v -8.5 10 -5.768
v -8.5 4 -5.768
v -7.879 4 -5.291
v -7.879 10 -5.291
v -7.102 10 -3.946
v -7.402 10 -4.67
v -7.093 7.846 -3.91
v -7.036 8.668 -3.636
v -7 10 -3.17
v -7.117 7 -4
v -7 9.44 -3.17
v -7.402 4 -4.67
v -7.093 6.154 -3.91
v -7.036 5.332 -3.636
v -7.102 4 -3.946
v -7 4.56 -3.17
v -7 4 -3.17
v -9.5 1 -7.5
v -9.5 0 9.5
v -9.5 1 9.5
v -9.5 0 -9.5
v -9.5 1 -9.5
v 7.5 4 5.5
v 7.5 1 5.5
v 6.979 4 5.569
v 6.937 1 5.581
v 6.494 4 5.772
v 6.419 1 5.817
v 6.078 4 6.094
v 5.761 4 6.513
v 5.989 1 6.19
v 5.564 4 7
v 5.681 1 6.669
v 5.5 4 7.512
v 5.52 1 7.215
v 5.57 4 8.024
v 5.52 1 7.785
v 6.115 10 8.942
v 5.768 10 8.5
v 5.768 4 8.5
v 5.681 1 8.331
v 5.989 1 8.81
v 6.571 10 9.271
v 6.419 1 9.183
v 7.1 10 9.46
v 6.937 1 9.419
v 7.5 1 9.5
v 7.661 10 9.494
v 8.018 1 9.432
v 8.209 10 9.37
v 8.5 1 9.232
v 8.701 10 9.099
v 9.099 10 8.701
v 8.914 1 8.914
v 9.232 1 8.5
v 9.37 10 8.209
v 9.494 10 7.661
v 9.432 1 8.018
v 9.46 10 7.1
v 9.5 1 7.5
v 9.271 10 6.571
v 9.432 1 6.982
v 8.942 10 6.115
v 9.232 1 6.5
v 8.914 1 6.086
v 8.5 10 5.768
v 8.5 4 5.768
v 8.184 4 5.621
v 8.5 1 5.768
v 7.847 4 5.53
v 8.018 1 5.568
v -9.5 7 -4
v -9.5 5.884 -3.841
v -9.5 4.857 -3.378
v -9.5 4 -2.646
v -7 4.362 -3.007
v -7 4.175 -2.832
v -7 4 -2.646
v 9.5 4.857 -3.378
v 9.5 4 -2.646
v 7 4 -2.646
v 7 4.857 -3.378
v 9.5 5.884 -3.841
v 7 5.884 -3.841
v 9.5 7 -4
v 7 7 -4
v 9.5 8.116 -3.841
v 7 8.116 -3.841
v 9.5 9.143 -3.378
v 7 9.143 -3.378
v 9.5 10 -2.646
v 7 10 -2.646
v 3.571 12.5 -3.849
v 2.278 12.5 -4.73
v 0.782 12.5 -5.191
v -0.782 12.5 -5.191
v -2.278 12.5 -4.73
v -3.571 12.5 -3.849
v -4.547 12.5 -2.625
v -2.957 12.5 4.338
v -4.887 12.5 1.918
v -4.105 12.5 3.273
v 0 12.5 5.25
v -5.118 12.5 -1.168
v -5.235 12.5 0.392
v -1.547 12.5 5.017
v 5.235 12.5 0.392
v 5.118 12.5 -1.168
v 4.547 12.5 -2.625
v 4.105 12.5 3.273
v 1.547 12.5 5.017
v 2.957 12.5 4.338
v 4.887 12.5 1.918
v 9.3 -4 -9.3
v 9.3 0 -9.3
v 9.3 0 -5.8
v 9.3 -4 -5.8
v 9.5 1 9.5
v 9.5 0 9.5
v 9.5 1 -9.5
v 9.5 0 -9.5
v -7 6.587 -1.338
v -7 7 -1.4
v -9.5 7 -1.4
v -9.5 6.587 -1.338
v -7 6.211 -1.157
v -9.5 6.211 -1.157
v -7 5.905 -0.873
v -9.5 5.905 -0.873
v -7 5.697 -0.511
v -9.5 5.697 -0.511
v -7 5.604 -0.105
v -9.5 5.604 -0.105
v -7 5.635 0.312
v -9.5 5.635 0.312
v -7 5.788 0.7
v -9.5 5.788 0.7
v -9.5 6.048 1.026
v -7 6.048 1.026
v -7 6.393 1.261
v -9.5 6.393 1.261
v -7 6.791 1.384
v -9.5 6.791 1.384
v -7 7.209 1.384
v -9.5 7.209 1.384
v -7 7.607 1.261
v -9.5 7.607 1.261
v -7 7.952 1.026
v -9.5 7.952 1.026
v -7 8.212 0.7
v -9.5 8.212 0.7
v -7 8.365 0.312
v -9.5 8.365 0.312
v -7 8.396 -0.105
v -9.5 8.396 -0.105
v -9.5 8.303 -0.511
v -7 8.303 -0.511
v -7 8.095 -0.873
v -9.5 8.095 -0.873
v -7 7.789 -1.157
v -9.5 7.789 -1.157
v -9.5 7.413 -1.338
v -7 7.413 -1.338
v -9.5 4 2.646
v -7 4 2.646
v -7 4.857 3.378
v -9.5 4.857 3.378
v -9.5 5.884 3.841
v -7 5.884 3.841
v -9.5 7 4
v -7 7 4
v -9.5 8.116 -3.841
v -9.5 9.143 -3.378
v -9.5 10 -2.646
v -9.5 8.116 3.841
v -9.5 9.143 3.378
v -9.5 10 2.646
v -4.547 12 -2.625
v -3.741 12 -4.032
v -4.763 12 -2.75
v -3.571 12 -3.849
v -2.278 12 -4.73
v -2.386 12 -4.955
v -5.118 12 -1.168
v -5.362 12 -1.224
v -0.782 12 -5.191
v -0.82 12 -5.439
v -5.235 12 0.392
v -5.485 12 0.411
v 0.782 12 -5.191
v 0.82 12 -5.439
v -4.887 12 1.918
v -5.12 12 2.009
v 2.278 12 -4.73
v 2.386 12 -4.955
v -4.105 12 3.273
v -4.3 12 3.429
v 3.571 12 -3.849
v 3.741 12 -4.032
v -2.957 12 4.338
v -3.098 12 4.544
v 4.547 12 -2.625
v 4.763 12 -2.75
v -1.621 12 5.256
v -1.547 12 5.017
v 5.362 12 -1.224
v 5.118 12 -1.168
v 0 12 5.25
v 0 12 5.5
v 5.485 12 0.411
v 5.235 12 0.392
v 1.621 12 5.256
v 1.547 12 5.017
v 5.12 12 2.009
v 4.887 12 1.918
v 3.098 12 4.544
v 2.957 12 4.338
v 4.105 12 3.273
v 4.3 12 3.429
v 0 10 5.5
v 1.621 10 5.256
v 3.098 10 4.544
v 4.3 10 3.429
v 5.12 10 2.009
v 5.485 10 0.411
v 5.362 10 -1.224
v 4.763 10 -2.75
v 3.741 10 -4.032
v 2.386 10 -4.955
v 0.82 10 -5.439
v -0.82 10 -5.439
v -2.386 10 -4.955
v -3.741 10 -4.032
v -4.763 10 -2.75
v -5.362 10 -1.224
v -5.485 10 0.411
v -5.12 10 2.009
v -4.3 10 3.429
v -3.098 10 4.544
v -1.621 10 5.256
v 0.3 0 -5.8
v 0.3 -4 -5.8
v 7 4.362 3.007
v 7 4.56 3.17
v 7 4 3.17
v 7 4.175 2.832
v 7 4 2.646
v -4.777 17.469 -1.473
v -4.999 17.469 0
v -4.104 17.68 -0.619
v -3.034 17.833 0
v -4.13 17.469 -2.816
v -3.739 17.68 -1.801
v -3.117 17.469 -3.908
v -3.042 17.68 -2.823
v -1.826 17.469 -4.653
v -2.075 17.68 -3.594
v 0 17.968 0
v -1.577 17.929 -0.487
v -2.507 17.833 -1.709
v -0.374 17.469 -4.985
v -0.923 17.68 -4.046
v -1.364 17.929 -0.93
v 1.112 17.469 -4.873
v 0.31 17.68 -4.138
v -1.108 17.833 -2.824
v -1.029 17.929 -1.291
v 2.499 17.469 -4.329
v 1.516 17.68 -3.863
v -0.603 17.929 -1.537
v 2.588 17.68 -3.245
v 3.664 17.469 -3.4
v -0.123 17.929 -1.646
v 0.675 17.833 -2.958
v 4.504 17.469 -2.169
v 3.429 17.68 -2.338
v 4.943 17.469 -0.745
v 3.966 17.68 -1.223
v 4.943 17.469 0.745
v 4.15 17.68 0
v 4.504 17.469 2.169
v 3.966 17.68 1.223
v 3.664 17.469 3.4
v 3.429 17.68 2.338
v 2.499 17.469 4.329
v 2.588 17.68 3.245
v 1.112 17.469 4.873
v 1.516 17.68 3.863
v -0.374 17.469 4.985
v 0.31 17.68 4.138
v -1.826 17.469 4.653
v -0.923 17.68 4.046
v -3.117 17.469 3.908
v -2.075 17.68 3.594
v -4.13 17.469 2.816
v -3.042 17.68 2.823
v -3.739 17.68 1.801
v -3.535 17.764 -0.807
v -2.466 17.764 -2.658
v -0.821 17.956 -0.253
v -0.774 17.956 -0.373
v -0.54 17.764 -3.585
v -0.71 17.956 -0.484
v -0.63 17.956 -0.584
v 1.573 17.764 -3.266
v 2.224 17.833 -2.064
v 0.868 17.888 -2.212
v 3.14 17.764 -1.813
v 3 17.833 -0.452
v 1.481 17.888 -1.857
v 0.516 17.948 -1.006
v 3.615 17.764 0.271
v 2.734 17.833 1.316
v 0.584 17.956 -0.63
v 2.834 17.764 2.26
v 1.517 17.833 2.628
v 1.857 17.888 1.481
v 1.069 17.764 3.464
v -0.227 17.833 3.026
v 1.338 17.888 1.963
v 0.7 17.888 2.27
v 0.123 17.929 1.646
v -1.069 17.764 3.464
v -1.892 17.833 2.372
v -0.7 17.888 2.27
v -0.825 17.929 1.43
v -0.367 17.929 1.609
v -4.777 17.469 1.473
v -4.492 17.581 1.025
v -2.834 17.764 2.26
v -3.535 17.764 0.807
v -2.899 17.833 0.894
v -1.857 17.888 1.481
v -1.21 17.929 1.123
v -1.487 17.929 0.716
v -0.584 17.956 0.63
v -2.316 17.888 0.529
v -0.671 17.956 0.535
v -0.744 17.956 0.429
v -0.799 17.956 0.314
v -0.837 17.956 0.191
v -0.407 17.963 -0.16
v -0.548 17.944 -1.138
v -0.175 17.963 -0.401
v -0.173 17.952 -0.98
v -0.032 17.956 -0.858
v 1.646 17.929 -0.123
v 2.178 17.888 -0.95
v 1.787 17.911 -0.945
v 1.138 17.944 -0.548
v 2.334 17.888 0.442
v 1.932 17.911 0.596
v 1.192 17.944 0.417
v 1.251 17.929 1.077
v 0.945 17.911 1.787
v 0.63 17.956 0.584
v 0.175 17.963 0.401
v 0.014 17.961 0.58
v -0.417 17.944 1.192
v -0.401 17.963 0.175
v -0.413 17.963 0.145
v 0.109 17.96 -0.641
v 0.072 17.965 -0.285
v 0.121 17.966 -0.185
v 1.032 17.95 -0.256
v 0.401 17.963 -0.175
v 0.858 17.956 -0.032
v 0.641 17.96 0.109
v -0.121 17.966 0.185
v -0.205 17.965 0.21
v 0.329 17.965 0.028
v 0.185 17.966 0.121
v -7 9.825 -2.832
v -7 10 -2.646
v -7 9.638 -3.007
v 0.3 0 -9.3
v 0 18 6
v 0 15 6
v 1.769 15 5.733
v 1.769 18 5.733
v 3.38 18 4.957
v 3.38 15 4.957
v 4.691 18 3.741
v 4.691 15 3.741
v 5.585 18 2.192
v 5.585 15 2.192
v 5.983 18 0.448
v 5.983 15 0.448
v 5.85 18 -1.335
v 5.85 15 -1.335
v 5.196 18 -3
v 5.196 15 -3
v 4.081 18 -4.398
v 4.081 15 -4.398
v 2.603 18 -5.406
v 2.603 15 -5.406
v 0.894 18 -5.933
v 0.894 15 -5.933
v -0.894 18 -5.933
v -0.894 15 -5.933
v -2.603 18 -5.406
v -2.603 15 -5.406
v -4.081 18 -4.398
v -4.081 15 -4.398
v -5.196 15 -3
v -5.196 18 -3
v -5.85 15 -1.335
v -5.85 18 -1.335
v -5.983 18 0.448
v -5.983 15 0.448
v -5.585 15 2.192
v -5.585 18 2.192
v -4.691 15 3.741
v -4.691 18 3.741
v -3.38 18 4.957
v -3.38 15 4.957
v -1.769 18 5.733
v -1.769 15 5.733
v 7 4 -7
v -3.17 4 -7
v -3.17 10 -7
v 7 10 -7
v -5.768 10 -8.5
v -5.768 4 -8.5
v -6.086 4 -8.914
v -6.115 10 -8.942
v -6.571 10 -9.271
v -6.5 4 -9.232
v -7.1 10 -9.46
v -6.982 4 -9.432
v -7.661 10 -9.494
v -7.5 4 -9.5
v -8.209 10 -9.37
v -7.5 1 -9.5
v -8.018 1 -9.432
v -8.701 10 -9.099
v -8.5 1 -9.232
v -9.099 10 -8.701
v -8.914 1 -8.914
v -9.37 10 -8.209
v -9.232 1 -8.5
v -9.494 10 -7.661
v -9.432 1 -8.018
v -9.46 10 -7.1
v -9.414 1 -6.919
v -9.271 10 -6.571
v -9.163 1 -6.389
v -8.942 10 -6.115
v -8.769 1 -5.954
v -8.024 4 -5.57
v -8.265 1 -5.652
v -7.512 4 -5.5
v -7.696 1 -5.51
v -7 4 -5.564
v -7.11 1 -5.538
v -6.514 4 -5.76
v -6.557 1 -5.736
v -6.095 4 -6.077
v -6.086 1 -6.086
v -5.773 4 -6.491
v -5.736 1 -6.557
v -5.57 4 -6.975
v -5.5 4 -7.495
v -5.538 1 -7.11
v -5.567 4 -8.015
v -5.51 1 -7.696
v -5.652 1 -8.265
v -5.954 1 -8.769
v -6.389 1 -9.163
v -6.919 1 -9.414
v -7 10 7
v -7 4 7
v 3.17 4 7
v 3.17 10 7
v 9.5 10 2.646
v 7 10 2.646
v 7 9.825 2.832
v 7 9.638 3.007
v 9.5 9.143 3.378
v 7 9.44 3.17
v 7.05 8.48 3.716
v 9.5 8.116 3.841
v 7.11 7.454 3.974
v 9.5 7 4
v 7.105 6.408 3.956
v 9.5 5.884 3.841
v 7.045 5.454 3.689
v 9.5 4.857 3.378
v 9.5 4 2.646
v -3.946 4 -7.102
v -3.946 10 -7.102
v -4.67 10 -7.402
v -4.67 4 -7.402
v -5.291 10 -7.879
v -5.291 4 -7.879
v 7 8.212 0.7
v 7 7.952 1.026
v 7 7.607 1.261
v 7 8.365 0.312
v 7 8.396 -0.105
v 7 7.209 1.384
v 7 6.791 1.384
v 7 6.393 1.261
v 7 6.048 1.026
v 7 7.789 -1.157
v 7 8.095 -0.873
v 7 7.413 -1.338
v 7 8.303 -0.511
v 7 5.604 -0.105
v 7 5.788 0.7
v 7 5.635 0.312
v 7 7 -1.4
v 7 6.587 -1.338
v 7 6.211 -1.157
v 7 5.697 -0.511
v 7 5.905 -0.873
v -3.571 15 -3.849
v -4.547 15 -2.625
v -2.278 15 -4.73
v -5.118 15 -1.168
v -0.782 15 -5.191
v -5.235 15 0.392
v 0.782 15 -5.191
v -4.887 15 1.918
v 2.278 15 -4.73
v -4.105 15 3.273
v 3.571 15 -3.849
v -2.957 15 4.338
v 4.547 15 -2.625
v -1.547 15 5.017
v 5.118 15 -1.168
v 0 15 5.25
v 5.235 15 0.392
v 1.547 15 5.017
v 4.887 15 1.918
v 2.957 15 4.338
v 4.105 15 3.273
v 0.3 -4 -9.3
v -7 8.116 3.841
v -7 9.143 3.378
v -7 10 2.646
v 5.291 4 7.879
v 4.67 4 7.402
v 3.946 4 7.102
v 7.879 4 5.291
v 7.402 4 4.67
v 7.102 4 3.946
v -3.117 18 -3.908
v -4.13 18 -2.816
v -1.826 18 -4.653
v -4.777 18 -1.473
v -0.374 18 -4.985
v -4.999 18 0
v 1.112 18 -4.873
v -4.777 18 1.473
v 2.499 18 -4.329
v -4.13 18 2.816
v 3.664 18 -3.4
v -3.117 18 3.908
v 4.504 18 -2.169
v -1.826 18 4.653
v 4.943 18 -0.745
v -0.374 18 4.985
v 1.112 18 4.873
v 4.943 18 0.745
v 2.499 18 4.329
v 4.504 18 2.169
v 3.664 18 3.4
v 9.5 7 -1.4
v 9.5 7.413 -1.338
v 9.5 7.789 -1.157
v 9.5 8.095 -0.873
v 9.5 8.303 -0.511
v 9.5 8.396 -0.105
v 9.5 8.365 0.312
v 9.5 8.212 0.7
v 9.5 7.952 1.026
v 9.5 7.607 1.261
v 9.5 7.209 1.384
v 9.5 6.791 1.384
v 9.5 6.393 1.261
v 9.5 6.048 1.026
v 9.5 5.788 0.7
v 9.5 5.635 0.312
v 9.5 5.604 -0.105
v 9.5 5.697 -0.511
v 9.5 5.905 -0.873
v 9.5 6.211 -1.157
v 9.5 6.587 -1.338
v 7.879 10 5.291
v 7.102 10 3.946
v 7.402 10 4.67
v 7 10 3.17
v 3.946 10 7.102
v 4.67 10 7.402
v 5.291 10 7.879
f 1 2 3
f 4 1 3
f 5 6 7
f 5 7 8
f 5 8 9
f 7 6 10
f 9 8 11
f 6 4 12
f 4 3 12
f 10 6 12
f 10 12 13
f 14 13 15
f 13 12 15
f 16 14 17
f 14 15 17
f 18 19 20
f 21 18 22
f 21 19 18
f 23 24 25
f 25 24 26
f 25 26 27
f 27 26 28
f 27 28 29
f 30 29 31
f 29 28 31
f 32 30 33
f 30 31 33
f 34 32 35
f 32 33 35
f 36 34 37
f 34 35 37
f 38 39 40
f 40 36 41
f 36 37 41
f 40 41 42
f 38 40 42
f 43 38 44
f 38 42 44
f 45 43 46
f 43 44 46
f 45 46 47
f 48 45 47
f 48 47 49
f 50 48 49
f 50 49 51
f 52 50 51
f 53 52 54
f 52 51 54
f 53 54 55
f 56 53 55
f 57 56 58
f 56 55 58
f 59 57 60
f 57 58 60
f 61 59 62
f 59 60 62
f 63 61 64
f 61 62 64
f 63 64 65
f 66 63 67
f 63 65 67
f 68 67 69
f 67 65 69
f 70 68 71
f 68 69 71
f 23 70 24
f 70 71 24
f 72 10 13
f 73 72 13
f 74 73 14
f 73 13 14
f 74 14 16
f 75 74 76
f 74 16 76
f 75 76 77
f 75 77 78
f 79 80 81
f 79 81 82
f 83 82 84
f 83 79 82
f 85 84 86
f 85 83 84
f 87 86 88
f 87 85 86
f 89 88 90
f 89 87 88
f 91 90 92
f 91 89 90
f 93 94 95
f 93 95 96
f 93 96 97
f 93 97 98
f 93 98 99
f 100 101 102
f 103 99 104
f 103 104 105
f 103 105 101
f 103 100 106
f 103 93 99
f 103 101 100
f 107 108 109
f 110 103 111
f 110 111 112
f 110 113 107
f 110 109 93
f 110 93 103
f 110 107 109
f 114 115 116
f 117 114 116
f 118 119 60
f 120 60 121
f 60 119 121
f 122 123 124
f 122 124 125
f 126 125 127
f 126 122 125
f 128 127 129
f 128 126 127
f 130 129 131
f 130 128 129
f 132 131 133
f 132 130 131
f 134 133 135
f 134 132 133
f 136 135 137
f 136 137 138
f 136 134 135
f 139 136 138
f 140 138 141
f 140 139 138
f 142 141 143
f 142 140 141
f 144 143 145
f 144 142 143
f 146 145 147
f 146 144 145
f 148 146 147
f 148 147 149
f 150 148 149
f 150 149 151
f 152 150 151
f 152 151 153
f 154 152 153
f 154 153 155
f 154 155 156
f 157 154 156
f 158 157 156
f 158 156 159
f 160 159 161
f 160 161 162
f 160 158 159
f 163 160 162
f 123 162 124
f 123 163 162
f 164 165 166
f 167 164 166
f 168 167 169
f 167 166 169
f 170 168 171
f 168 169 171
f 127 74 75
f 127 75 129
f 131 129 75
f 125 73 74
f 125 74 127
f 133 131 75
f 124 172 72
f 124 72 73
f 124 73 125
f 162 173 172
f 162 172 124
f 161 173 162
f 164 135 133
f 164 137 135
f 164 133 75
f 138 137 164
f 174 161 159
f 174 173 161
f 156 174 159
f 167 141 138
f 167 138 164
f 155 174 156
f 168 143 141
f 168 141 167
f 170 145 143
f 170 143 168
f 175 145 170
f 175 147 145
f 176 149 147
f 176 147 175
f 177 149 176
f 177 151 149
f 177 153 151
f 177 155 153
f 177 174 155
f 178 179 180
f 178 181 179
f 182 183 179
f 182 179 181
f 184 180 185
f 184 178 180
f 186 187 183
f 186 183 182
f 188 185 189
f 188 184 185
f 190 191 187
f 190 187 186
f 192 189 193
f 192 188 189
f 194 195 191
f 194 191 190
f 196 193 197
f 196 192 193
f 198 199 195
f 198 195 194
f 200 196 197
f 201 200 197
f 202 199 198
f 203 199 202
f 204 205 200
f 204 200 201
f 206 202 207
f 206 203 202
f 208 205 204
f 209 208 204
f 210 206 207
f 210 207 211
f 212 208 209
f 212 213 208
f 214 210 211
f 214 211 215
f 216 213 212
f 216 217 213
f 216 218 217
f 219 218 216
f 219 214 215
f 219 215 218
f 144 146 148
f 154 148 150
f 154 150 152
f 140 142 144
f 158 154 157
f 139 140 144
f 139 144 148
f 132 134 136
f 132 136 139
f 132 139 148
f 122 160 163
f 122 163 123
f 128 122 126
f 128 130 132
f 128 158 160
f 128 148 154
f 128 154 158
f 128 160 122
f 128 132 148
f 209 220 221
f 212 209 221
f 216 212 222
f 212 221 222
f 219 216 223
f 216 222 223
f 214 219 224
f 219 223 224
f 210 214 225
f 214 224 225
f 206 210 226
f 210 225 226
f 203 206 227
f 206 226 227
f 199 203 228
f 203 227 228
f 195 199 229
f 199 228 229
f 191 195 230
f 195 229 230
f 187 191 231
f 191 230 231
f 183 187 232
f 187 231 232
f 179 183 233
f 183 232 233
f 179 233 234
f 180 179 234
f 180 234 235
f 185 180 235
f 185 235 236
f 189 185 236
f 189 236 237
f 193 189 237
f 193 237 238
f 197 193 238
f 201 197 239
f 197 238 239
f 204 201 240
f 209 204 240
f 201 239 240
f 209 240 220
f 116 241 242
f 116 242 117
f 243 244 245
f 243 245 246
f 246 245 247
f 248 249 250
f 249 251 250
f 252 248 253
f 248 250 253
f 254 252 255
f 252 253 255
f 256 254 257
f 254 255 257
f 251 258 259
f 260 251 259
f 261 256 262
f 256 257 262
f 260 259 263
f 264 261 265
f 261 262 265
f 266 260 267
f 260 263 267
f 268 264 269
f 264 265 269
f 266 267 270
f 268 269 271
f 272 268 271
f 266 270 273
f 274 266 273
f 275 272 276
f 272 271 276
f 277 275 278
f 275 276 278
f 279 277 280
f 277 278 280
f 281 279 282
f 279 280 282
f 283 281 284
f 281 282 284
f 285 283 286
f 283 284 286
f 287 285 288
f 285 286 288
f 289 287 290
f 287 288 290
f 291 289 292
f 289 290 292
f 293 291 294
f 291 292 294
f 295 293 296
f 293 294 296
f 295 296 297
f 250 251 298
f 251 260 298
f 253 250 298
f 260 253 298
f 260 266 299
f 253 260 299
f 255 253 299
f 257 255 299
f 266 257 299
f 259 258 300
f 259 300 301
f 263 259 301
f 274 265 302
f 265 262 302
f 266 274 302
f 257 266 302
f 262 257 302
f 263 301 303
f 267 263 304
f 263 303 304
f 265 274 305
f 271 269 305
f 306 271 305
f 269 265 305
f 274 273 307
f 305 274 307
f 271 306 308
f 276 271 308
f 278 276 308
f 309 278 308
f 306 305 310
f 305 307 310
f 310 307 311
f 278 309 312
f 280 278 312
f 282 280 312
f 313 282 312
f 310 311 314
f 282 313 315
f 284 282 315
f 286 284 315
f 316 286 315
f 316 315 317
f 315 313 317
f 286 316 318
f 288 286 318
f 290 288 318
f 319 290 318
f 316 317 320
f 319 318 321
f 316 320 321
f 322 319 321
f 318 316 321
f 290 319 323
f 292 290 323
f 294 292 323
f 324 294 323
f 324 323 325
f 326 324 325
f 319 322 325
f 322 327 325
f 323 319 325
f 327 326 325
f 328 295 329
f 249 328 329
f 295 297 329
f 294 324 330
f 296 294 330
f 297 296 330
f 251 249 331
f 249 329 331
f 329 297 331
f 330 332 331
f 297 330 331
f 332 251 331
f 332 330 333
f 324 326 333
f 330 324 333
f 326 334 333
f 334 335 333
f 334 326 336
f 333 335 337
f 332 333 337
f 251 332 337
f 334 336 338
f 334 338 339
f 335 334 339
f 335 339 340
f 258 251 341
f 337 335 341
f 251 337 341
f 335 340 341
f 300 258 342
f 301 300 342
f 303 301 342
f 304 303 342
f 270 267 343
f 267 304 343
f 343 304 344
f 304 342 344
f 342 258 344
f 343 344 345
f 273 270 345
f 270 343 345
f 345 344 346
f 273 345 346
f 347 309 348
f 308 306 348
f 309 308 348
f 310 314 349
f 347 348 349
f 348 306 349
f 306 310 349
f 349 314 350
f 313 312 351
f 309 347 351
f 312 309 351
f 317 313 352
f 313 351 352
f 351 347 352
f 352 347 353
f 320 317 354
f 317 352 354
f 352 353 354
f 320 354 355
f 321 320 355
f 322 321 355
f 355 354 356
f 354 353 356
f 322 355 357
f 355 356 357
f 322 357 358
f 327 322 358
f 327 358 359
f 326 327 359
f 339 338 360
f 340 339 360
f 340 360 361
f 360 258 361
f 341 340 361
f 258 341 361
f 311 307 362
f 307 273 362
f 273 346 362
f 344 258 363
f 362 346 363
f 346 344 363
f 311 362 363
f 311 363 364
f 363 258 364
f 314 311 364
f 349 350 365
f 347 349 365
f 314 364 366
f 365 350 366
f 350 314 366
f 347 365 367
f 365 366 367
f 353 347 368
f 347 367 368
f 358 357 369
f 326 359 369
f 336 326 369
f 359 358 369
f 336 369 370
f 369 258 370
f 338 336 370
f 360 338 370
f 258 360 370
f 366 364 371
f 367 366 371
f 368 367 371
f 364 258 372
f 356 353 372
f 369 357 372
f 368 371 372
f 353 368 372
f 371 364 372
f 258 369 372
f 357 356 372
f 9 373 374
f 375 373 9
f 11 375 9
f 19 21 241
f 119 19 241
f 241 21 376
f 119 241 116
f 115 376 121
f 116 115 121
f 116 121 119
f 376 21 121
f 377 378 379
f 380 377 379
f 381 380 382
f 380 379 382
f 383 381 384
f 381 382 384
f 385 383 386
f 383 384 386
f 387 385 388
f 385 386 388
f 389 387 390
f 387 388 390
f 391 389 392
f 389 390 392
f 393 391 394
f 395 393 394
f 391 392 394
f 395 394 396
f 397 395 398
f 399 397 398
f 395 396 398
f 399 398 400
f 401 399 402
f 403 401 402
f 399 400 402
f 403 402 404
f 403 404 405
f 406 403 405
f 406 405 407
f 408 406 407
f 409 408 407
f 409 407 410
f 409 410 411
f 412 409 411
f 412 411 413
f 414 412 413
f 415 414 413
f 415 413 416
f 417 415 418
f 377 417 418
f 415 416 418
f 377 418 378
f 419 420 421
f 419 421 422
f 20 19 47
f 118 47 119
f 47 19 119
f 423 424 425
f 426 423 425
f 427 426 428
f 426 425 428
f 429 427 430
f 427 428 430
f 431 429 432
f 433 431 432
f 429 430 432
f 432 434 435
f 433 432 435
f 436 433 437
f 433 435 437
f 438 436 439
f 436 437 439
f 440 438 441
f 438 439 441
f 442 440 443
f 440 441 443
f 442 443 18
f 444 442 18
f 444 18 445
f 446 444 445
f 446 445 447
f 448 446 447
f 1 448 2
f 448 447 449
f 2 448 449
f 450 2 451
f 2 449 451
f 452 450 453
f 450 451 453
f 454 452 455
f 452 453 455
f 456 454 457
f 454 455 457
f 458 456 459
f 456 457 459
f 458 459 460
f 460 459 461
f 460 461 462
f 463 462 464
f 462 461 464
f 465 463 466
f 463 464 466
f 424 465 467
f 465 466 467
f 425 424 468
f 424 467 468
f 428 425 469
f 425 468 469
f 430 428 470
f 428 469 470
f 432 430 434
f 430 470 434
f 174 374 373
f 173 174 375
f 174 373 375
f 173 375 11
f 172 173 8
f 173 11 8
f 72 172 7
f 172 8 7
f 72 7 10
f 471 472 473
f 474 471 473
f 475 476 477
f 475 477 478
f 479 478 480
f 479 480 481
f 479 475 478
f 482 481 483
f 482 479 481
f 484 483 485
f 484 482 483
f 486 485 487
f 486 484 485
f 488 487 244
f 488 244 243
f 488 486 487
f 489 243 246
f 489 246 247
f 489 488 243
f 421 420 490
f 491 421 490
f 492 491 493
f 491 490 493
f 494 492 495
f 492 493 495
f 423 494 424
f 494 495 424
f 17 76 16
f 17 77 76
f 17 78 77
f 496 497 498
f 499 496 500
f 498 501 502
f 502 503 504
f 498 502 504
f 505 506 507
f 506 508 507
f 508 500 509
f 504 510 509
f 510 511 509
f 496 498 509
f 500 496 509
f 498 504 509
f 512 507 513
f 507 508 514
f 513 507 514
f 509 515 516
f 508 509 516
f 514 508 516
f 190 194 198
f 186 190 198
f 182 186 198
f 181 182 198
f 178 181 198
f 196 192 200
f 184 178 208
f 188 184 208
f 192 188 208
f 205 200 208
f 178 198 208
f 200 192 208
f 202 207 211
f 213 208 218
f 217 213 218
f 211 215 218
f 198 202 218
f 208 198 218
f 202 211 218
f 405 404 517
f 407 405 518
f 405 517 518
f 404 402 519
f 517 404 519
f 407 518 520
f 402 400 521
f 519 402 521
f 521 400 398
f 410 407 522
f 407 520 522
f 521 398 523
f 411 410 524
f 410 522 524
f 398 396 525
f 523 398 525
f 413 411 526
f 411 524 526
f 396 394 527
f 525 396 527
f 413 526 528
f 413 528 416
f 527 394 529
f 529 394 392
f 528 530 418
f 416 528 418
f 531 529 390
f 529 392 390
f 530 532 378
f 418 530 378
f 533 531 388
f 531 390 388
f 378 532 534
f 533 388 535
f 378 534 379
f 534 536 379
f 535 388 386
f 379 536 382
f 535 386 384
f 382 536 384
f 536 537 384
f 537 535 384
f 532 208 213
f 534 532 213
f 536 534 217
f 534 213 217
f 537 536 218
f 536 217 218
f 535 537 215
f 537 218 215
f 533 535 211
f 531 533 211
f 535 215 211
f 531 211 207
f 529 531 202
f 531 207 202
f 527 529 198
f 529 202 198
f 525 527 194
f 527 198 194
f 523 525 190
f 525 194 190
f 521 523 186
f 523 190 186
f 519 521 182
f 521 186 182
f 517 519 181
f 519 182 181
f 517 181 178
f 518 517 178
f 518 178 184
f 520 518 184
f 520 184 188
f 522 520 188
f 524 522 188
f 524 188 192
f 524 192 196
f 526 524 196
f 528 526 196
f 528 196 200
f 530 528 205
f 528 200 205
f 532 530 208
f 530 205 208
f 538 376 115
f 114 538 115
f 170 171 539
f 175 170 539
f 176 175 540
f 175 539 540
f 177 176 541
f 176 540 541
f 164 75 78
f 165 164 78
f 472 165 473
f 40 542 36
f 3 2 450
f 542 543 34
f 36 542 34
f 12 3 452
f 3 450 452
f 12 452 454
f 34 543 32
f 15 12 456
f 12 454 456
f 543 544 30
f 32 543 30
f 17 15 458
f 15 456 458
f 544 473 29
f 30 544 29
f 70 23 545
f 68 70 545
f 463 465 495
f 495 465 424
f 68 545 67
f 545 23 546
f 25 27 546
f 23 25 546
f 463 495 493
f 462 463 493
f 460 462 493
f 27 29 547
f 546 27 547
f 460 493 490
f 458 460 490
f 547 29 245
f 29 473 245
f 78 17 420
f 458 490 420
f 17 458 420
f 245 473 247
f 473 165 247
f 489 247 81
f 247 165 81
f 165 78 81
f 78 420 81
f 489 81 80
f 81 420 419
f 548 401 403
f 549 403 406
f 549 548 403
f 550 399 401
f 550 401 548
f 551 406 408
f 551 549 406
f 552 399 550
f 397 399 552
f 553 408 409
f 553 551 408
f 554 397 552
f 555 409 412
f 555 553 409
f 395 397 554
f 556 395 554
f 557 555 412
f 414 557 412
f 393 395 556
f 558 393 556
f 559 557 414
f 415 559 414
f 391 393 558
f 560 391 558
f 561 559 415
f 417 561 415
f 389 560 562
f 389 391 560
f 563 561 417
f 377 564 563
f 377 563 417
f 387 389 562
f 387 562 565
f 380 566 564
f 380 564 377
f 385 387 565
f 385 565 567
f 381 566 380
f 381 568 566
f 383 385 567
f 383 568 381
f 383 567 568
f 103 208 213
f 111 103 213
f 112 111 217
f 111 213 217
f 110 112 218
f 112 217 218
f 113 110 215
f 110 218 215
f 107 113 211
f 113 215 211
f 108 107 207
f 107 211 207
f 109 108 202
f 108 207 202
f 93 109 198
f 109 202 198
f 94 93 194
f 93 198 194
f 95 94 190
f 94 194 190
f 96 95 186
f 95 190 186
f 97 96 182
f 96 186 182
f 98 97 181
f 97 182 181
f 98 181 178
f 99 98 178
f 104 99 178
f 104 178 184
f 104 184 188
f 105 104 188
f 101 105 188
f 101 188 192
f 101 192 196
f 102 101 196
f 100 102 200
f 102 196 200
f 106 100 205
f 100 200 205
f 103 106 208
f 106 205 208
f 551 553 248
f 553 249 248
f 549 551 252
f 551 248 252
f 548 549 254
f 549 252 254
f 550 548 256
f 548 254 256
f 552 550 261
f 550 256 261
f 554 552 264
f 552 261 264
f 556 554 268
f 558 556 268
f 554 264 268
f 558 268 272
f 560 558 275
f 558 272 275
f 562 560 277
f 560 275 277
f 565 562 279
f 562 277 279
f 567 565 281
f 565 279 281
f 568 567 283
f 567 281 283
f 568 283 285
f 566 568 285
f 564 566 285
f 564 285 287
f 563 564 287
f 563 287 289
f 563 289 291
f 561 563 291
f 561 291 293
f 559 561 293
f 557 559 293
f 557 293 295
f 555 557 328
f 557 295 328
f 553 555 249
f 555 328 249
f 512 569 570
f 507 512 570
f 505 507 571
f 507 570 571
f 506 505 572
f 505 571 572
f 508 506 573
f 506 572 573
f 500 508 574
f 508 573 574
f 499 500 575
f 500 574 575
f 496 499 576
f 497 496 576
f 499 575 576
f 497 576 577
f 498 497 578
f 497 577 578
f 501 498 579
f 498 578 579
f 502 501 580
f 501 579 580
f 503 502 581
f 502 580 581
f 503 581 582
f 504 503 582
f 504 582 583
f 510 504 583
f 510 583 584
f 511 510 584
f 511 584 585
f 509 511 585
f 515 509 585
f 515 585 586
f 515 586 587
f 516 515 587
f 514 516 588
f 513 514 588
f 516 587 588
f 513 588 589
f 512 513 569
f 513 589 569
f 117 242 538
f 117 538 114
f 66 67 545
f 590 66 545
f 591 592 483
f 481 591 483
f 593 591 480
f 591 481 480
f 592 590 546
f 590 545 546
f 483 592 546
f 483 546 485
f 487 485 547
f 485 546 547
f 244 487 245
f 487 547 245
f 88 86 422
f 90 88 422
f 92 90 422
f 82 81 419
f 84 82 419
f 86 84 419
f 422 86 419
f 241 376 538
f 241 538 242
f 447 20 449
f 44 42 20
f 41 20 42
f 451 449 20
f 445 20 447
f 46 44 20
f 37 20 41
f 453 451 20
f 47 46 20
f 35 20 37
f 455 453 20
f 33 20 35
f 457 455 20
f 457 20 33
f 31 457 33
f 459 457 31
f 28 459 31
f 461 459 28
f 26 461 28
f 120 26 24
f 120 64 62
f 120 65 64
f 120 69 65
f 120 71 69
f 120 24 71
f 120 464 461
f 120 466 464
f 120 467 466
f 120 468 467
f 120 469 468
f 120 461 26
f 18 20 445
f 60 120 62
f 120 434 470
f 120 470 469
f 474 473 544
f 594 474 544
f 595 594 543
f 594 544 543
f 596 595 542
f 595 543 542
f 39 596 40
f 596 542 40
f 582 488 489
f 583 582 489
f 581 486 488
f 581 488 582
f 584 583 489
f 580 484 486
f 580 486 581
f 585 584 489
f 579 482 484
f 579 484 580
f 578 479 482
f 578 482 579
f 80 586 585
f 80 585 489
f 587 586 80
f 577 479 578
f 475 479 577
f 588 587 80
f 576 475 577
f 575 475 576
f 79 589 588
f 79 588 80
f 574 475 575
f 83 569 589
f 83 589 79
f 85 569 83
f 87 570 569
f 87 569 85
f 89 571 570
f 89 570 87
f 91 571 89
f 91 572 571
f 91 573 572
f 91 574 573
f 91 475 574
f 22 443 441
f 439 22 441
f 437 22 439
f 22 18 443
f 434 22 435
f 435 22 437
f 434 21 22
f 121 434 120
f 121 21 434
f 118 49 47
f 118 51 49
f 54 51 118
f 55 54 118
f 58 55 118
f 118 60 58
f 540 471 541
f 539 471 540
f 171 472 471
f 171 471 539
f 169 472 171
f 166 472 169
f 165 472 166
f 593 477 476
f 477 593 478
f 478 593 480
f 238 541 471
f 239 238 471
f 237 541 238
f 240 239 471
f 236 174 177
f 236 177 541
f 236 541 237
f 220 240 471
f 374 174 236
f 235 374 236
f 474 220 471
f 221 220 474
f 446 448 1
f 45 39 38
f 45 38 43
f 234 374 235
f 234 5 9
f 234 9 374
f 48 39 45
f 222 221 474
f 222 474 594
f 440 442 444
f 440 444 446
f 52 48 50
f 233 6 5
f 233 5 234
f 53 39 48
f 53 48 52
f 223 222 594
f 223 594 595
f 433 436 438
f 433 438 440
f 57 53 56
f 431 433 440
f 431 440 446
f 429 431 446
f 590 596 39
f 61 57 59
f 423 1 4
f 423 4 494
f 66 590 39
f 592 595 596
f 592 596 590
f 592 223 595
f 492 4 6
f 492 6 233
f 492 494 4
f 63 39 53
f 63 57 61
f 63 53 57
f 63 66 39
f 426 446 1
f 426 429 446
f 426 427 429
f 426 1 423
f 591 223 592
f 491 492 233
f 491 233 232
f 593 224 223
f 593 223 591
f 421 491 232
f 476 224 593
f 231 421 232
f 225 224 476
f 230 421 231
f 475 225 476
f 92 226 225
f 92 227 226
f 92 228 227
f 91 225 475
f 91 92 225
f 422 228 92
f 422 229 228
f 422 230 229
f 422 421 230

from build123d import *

# Parameters (mm, degrees)
SKETCH1_W            = 19
SKETCH1_H            = 19
BOSS_EXTRUDE1_DEPTH  = 1
SKETCH2_R            = 2
BOSS_EXTRUDE2_DEPTH  = 3
SKETCH3_R            = 2
SKETCH3_W            = 14
SKETCH3_H            = 14
BOSS_EXTRUDE3_DEPTH  = 6
SKETCH4_R            = 1.4
BOSS_EXTRUDE4_DEPTH  = 2.5
BOSS_EXTRUDE5_START  = 2.5
SKETCH5_R            = 1.4
BOSS_EXTRUDE5_DEPTH  = 2.5
SKETCH6_R            = 5.5
BOSS_EXTRUDE6_DEPTH  = 2
SKETCH7_R            = 5.25
BOSS_EXTRUDE7_DEPTH  = 3
SKETCH8_R            = 6
BOSS_EXTRUDE8_DEPTH  = 3
SKETCH12_W           = 9
SKETCH12_H           = 3.5
BOSS_EXTRUDE9_DEPTH  = 4
FILLET1_START        = 4
FILLET1_DEPTH        = 6
SKETCH14_R           = 5.25
BOSS_EXTRUDE11_DEPTH = 0.5


with BuildPart() as part:
    # Sketch1 → Boss-Extrude1 (new body)
    with BuildSketch(Plane(origin=(0, 0, 0), x_dir=(1, 0, 0), z_dir=(0, 1, 0))):
        Rectangle(SKETCH1_W, SKETCH1_H)
    extrude(amount=BOSS_EXTRUDE1_DEPTH)

    # Sketch2 → Boss-Extrude2 (add)
    with BuildSketch(Plane(origin=(0, 1, 0), x_dir=(1, 0, 0), z_dir=(0, 1, 0))):
        with Locations(Location((-7.5, 7.5, 0), (0, 0, 90))):
            Circle(SKETCH2_R)
        with Locations(Location((7.5, -7.5, 0), (0, 0, 90))):
            Circle(SKETCH2_R)
    extrude(amount=BOSS_EXTRUDE2_DEPTH)

    # Sketch3 → Boss-Extrude3 (add)
    with BuildSketch(Plane(origin=(0, 4, 0), x_dir=(1, 0, 0), z_dir=(0, 1, 0))):
        with Locations(Location((7.5, -7.5, 0), (0, 0, 104.477512186))):
            Circle(SKETCH3_R)
        with Locations(Location((-7.5, 7.5, 0), (0, 0, 90))):
            Circle(SKETCH3_R)
        Rectangle(SKETCH3_W, SKETCH3_H)
    extrude(amount=BOSS_EXTRUDE3_DEPTH)

    # Sketch4 → Boss-Extrude4 (add)
    with BuildSketch(Plane.ZY.offset(7)):
        with BuildLine():
            ThreePointArc((4, 7), (3.645751311, 8.645751311), (2.645751311, 10))
            Line((2.645751311, 10), (-2.645751311, 10))
            ThreePointArc((-2.645751311, 10), (-3.645751311, 8.645751311), (-4, 7))
            ThreePointArc((-4, 7), (-3.645751311, 5.354248689), (-2.645751311, 4))
            Line((-2.645751311, 4), (2.645751311, 4))
            ThreePointArc((2.645751311, 4), (3.645751311, 5.354248689), (4, 7))
        make_face()
        with Locations(Location((0, 7, 0), (0, 0, 180))):
            Circle(SKETCH4_R, mode=Mode.SUBTRACT)
    extrude(amount=BOSS_EXTRUDE4_DEPTH)

    # Sketch5 → Boss-Extrude5 (add)
    with BuildSketch(Plane(origin=(7, 0, 0), x_dir=(0, 0, -1), z_dir=(1, 0, 0)).offset(BOSS_EXTRUDE5_START)):
        with BuildLine():
            Line((-2.645751311, 4), (2.645751311, 4))
            ThreePointArc((2.645751311, 4), (4, 7), (2.645751311, 10))
            Line((2.645751311, 10), (-2.645751311, 10))
            ThreePointArc((-2.645751311, 10), (-4, 7), (-2.645751311, 4))
        make_face()
        with Locations((0, 7)):
            Circle(SKETCH5_R, mode=Mode.SUBTRACT)
    extrude(amount=-BOSS_EXTRUDE5_DEPTH)

    # Sketch6 → Boss-Extrude6 (add)
    with BuildSketch(Plane(origin=(0, 10, 0), x_dir=(1, 0, 0), z_dir=(0, 1, 0))):
        with Locations(Location((0, 0, 0), (0, 0, 270))):
            Circle(SKETCH6_R)
    extrude(amount=BOSS_EXTRUDE6_DEPTH)

    # Sketch7 → Boss-Extrude7 (add)
    with BuildSketch(Plane(origin=(0, 12, 0), x_dir=(1, 0, 0), z_dir=(0, 1, 0))):
        with Locations(Location((0, 0, 0), (0, 0, 270))):
            Circle(SKETCH7_R)
    extrude(amount=BOSS_EXTRUDE7_DEPTH)

    # Sketch8 → Boss-Extrude8 (add)
    with BuildSketch(Plane(origin=(0, 15, 0), x_dir=(1, 0, 0), z_dir=(0, 1, 0))):
        with Locations(Location((0, 0, 0), (0, 0, 270))):
            Circle(SKETCH8_R)
    extrude(amount=BOSS_EXTRUDE8_DEPTH)

    # Sketch11 → Cut-Revolve3 (revolve, cut)
    with BuildSketch(Plane.XY):
        with BuildLine():
            Line((-4.998697143, 18), (-4.998697143, 17.468751676))
            add(Edge.make_bspline(
                [(-4.998697143, 17.468751676), (-3.568709189, 17.948183153), (0, 17.967671606)],
                knots=[0, 0, 0, 1, 1, 1], degree=2))
            Line((0, 17.967671606), (0, 18))
            Line((0, 18), (-4.998697143, 18))
        make_face()
    revolve(axis=Axis((0, 18, 0), (0, -1, 0)), mode=Mode.SUBTRACT)

    # Sketch12 → Boss-Extrude9 (add)
    with BuildSketch(Plane.XZ):
        with Locations((4.8, -7.55)):
            Rectangle(SKETCH12_W, SKETCH12_H)
    extrude(amount=BOSS_EXTRUDE9_DEPTH)

    # Fillet1: read off the stored shape, not the designer's step
    # Fillet1 outline → Fillet1 (add)
    with BuildSketch(Plane(origin=(0, 0, 0), x_dir=(1, 0, 0), z_dir=(0, 1, 0)).offset(FILLET1_START)):
        with BuildLine():
            ThreePointArc((-7, 5.563508327), (-7.770090757, 5.518321171), (-8.5, 5.767949192))
            ThreePointArc((-8.5, 5.767949192), (-7.401923789, 4.669872981), (-7, 3.169872981))
            Line((-7, 3.169872981), (-7, 5.563508327))
        make_face()
        with BuildLine():
            ThreePointArc((-3.169872981, 7), (-4.669872981, 7.401923789), (-5.767949192, 8.5))
            ThreePointArc((-5.767949192, 8.5), (-5.518321171, 7.770090757), (-5.563508327, 7))
            Line((-5.563508327, 7), (-3.169872981, 7))
        make_face()
        with BuildLine():
            ThreePointArc((7, -5.563508327), (7.770090757, -5.518321171), (8.5, -5.767949192))
            ThreePointArc((8.5, -5.767949192), (7.401923789, -4.669872981), (7, -3.169872981))
            Line((7, -3.169872981), (7, -5.563508327))
        make_face()
        with BuildLine():
            ThreePointArc((3.169872981, -7), (4.669872981, -7.401923789), (5.767949192, -8.5))
            ThreePointArc((5.767949192, -8.5), (5.518321171, -7.770090757), (5.563508327, -7))
            Line((5.563508327, -7), (3.169872981, -7))
        make_face()
    extrude(amount=FILLET1_DEPTH)


with BuildPart() as body_2:
    # Sketch14 → Boss-Extrude11 (new body)
    with BuildSketch(Plane(origin=(0, 12, 0), x_dir=(1, 0, 0), z_dir=(0, 1, 0))):
        with Locations(Location((0, 0, 0), (0, 0, 270))):
            Circle(SKETCH14_R)
    extrude(amount=BOSS_EXTRUDE11_DEPTH)


solid = Compound([part.part, body_2.part])
